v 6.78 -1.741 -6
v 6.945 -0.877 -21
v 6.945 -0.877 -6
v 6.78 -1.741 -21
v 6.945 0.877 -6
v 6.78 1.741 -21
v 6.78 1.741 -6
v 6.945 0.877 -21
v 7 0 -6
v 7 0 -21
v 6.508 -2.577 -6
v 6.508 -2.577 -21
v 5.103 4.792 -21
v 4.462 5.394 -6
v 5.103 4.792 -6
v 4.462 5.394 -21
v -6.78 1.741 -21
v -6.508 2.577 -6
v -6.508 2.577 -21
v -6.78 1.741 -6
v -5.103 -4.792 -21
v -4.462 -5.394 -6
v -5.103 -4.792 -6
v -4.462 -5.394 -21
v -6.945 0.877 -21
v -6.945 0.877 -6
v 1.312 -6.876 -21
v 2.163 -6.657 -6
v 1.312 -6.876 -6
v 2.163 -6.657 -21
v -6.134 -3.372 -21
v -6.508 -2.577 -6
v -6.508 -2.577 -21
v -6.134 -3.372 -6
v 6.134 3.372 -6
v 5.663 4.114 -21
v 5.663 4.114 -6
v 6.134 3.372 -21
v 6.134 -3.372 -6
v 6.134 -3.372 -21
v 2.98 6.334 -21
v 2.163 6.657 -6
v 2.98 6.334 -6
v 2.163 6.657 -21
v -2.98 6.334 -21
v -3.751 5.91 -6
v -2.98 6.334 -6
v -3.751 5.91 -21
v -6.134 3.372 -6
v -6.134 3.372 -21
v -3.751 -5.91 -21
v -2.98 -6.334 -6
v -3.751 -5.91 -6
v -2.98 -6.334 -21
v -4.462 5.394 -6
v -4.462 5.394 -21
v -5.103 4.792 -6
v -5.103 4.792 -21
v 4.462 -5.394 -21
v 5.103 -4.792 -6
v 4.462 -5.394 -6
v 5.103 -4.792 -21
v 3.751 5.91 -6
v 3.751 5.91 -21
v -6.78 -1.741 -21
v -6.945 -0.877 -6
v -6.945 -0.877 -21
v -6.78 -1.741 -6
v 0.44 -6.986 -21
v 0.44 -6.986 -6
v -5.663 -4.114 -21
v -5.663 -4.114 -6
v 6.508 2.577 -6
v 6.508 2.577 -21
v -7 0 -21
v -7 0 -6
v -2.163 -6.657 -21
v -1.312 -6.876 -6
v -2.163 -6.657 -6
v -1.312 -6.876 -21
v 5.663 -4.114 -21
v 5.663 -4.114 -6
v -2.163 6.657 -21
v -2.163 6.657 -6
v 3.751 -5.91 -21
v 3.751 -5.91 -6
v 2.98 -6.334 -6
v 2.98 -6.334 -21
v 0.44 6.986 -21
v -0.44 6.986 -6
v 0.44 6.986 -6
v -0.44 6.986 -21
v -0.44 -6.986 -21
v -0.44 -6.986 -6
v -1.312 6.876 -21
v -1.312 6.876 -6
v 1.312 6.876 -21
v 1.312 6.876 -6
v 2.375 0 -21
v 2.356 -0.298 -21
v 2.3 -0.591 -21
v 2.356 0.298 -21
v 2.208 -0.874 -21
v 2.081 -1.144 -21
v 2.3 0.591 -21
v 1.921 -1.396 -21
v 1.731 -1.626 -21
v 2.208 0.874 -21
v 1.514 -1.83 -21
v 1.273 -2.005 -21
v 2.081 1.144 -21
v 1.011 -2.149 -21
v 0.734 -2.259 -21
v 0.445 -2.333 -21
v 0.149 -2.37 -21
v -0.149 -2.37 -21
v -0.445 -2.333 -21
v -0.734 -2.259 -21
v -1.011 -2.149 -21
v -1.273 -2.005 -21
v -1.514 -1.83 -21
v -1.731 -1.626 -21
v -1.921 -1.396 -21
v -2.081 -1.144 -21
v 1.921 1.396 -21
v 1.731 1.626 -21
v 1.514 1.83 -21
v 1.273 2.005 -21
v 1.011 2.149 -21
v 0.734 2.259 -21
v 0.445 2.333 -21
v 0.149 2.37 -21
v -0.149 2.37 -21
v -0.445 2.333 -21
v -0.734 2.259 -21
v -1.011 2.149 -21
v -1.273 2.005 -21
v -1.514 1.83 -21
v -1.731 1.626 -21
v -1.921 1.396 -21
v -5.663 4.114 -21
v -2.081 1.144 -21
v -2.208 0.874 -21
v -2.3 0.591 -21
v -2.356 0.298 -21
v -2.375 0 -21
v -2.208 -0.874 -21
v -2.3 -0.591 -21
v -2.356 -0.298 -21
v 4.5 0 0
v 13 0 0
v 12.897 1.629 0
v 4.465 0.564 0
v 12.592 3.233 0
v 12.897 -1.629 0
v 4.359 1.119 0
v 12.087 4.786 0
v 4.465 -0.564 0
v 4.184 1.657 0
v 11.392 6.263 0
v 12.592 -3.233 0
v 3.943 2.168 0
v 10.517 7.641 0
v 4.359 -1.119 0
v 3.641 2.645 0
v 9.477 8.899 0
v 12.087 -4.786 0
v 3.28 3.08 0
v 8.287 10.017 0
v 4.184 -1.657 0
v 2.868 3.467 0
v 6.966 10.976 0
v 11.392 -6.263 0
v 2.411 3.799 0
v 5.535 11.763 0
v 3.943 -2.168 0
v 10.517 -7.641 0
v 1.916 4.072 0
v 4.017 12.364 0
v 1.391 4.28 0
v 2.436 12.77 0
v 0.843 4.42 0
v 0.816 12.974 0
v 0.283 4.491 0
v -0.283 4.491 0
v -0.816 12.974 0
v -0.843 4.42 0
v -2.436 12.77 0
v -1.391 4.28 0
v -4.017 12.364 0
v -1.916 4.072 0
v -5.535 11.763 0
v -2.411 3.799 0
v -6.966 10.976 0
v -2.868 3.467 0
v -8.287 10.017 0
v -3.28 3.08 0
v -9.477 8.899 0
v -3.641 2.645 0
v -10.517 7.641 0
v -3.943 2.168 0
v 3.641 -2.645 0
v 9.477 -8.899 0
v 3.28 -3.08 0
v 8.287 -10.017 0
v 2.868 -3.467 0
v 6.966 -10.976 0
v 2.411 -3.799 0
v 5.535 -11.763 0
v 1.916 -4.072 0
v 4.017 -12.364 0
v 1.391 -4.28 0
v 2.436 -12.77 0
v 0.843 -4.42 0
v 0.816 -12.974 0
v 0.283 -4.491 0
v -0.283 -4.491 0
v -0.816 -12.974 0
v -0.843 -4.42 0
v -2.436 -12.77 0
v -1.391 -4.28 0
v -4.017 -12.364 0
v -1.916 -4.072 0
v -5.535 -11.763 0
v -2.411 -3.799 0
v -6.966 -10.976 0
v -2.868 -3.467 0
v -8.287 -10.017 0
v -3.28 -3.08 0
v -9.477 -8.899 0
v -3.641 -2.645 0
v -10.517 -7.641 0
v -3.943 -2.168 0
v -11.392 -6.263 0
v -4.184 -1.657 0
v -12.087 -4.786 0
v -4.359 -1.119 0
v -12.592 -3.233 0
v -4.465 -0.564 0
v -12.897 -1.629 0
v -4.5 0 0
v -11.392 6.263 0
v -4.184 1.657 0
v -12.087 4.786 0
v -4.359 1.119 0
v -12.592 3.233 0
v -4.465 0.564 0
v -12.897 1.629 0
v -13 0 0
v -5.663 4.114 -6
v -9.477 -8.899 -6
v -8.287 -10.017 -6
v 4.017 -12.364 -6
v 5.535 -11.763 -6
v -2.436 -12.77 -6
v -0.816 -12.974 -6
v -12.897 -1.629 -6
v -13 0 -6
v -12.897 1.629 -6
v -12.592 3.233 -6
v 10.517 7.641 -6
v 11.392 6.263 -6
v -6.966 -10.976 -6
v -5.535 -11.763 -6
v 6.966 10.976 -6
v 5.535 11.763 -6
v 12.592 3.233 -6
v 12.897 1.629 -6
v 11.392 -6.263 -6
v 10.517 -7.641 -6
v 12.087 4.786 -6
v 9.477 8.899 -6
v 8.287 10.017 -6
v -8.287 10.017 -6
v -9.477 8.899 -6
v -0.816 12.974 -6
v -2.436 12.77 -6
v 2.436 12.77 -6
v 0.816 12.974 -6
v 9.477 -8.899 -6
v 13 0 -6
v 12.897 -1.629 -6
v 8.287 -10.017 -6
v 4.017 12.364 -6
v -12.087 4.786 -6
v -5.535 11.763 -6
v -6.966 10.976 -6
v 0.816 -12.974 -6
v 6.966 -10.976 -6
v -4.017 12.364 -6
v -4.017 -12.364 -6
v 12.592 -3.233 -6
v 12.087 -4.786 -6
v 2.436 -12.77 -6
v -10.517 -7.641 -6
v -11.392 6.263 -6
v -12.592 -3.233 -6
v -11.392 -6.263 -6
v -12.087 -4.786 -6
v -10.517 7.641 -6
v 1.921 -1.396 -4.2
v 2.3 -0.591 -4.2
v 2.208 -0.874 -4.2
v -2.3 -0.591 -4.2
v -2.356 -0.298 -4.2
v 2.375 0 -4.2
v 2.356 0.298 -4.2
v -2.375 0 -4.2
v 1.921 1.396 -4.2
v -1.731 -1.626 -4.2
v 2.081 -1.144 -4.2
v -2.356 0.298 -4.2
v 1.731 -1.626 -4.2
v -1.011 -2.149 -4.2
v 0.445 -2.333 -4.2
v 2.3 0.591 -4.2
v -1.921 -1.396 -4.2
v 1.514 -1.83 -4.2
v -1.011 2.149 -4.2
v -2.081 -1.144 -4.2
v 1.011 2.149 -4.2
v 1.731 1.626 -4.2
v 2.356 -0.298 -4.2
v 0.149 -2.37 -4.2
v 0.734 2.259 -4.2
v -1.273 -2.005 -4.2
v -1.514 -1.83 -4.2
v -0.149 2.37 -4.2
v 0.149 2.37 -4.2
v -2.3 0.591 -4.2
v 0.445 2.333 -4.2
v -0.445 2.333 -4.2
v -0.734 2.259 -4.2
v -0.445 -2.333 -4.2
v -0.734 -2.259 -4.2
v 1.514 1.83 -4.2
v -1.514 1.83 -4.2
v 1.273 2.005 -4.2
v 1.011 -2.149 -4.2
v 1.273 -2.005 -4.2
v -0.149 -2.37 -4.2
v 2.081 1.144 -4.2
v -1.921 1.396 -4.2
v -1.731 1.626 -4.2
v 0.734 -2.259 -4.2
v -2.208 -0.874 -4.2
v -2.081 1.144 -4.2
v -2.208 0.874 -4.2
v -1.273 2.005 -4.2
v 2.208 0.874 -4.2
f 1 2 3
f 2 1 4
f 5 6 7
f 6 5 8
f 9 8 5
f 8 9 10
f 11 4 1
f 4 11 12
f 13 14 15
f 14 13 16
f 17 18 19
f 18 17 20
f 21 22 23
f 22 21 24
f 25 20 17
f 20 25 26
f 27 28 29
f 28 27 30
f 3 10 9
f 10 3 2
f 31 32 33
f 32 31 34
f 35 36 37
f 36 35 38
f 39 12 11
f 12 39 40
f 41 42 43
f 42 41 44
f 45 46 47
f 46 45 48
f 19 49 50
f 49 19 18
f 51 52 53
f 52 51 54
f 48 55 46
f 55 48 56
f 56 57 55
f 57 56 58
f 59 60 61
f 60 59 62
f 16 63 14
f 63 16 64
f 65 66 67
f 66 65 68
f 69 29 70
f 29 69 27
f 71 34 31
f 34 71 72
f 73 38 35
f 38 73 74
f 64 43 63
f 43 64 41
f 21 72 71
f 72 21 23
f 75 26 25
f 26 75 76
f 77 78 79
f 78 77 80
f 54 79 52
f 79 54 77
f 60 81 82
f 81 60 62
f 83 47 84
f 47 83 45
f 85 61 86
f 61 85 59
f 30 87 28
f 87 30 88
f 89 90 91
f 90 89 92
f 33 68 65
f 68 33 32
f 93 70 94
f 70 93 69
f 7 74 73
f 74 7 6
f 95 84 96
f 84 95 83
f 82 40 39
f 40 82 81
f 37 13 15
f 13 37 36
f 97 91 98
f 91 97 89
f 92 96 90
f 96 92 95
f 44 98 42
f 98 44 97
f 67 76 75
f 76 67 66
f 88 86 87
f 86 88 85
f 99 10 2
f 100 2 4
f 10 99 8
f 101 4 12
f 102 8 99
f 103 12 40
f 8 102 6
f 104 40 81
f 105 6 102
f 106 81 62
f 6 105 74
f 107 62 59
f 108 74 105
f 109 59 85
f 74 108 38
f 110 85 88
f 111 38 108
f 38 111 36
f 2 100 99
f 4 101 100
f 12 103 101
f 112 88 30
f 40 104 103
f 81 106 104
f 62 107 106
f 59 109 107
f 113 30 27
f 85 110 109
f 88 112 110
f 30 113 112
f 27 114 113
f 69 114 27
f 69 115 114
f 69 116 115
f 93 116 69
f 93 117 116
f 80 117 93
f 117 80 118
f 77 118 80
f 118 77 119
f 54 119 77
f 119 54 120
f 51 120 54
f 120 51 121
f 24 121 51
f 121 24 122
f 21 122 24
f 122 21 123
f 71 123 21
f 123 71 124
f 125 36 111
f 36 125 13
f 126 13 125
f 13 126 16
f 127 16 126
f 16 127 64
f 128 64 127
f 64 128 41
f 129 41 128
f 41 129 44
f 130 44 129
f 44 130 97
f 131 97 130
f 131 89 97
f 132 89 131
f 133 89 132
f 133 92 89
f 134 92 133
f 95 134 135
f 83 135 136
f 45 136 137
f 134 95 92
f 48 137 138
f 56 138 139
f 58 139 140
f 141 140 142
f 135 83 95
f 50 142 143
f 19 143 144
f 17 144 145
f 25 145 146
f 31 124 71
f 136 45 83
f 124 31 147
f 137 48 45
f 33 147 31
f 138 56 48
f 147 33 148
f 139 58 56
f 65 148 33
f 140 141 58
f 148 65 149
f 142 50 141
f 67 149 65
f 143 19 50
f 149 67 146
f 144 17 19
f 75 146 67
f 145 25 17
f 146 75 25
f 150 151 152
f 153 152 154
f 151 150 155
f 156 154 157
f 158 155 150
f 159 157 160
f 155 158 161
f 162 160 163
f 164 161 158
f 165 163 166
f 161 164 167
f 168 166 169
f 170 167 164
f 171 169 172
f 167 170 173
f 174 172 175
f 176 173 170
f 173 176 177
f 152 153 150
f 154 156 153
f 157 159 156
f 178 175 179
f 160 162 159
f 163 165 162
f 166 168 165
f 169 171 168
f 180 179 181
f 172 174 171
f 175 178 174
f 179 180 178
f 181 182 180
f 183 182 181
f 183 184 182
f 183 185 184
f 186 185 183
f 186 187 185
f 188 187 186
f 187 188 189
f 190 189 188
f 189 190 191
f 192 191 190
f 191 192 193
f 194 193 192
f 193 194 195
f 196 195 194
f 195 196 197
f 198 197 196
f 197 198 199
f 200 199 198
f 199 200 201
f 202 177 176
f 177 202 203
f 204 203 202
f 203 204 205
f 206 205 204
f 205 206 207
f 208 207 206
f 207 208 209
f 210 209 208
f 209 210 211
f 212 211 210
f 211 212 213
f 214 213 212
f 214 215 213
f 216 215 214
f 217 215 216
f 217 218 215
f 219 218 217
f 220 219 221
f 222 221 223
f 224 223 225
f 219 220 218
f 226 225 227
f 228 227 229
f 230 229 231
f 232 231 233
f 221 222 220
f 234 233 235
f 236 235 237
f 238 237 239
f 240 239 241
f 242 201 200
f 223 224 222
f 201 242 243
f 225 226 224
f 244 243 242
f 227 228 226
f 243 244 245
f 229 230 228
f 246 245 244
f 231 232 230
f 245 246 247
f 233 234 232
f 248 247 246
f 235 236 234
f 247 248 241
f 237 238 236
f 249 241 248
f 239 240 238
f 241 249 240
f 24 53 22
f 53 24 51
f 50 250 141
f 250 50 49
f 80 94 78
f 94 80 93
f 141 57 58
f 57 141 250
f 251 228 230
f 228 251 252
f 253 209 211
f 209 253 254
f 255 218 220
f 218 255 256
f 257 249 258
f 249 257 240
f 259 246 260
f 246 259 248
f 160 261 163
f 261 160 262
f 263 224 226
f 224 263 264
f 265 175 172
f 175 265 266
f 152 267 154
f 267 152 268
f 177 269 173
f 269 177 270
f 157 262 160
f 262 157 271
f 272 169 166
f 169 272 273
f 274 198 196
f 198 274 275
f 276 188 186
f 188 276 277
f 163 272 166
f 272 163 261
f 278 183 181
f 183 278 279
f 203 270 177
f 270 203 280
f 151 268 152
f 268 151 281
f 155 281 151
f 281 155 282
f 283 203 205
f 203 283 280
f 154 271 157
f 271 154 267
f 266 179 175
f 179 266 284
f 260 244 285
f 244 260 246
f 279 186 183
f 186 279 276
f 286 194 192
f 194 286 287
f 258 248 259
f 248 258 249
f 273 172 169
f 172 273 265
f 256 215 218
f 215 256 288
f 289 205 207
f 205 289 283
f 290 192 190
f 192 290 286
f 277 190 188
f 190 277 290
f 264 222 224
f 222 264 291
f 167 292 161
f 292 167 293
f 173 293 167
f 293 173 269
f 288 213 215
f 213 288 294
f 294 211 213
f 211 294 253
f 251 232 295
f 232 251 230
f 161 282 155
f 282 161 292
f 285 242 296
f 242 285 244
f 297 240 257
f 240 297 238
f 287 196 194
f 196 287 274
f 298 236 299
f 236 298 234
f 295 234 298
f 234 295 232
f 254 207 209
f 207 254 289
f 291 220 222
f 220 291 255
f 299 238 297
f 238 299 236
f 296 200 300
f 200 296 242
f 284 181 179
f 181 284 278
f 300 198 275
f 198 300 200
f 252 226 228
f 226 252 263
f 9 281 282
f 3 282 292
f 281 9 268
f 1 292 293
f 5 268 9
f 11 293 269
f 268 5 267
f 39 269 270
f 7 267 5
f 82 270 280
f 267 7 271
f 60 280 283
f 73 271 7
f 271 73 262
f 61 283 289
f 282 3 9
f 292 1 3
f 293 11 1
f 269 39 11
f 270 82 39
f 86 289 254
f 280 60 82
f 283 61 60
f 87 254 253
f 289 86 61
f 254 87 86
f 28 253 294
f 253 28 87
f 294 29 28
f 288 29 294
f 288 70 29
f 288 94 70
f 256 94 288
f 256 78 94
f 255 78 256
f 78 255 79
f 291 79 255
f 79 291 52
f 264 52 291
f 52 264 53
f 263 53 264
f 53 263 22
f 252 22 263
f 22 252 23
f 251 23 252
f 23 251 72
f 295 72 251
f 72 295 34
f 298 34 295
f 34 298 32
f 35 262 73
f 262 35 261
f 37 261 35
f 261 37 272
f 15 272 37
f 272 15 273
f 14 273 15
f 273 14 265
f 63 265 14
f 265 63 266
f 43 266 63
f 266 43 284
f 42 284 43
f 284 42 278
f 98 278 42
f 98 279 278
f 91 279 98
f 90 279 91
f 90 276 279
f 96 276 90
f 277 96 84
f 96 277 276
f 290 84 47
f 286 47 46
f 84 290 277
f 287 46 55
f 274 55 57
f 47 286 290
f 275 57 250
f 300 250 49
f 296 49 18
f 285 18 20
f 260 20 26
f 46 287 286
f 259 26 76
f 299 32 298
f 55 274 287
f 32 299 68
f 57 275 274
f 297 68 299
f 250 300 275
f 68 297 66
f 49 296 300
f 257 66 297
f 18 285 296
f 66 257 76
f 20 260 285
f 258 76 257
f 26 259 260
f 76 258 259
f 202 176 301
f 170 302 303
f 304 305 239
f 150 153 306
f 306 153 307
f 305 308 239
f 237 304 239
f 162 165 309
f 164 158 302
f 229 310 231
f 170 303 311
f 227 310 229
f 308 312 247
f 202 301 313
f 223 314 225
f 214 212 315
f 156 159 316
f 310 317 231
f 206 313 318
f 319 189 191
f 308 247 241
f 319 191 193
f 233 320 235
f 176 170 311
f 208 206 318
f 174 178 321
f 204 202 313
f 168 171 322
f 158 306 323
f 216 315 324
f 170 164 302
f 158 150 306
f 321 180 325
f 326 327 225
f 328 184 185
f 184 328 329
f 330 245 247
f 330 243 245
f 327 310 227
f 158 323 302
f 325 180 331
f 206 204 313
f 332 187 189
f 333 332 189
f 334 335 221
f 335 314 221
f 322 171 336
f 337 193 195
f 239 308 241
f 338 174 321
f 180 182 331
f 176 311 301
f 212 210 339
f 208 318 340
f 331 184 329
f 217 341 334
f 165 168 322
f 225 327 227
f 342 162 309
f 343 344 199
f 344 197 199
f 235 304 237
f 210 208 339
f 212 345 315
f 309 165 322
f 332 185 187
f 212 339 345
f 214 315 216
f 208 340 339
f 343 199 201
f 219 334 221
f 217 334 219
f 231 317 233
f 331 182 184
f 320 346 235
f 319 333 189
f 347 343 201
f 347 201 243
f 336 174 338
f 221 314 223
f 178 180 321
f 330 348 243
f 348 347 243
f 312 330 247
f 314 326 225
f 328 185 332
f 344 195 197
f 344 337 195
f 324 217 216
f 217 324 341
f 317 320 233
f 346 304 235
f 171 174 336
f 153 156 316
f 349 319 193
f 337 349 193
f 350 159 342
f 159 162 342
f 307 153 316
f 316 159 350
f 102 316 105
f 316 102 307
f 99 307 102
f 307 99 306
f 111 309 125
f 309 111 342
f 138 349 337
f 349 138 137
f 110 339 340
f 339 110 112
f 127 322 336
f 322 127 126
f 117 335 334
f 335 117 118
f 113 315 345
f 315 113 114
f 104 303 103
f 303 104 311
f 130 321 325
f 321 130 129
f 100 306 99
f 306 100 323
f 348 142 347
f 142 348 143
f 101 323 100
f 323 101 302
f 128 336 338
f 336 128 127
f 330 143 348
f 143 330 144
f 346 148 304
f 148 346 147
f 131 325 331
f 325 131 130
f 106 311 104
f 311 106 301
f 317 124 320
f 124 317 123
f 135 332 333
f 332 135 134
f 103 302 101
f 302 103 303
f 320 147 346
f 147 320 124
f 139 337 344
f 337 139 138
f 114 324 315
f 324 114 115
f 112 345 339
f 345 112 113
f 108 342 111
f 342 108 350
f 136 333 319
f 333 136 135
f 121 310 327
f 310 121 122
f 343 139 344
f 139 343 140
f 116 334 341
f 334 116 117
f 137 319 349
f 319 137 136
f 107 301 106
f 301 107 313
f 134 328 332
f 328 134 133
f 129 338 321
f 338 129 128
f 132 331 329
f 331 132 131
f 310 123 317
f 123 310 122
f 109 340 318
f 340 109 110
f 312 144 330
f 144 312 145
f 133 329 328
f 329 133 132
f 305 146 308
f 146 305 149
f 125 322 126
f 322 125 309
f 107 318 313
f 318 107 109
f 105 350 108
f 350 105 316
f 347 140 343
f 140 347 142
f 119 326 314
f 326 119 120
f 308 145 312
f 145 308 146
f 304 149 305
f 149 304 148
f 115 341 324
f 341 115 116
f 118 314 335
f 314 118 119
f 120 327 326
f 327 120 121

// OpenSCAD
$fn = 50;


difference() {
	union() {
		translate(v = [0, 0, -21.0000000000]) {
			cylinder(h = 21, r = 7.0000000000);
		}
		translate(v = [0, 0, -6.0000000000]) {
			cylinder(h = 6, r = 13.0000000000);
		}
	}
	union() {
		translate(v = [0, 0, 0]) {
			rotate(a = [0, 0, 0]) {
				difference() {
					union() {
						#translate(v = [0, 0, -21.0000000000]) {
							cylinder(h = 21, r = 2.2500000000);
						}
						#translate(v = [0, 0, -4.2000000000]) {
							cylinder(h = 4.2000000000, r = 7.0000000000, r1 = 2.3750000000, r2 = 4.5000000000);
						}
						#translate(v = [0, 0, -21.0000000000]) {
							cylinder(h = 21, r = 2.3750000000);
						}
						#translate(v = [0, 0, -21.0000000000]) {
							cylinder(h = 21, r = 2.2500000000);
						}
					}
					union();
				}
			}
		}
	}
}
